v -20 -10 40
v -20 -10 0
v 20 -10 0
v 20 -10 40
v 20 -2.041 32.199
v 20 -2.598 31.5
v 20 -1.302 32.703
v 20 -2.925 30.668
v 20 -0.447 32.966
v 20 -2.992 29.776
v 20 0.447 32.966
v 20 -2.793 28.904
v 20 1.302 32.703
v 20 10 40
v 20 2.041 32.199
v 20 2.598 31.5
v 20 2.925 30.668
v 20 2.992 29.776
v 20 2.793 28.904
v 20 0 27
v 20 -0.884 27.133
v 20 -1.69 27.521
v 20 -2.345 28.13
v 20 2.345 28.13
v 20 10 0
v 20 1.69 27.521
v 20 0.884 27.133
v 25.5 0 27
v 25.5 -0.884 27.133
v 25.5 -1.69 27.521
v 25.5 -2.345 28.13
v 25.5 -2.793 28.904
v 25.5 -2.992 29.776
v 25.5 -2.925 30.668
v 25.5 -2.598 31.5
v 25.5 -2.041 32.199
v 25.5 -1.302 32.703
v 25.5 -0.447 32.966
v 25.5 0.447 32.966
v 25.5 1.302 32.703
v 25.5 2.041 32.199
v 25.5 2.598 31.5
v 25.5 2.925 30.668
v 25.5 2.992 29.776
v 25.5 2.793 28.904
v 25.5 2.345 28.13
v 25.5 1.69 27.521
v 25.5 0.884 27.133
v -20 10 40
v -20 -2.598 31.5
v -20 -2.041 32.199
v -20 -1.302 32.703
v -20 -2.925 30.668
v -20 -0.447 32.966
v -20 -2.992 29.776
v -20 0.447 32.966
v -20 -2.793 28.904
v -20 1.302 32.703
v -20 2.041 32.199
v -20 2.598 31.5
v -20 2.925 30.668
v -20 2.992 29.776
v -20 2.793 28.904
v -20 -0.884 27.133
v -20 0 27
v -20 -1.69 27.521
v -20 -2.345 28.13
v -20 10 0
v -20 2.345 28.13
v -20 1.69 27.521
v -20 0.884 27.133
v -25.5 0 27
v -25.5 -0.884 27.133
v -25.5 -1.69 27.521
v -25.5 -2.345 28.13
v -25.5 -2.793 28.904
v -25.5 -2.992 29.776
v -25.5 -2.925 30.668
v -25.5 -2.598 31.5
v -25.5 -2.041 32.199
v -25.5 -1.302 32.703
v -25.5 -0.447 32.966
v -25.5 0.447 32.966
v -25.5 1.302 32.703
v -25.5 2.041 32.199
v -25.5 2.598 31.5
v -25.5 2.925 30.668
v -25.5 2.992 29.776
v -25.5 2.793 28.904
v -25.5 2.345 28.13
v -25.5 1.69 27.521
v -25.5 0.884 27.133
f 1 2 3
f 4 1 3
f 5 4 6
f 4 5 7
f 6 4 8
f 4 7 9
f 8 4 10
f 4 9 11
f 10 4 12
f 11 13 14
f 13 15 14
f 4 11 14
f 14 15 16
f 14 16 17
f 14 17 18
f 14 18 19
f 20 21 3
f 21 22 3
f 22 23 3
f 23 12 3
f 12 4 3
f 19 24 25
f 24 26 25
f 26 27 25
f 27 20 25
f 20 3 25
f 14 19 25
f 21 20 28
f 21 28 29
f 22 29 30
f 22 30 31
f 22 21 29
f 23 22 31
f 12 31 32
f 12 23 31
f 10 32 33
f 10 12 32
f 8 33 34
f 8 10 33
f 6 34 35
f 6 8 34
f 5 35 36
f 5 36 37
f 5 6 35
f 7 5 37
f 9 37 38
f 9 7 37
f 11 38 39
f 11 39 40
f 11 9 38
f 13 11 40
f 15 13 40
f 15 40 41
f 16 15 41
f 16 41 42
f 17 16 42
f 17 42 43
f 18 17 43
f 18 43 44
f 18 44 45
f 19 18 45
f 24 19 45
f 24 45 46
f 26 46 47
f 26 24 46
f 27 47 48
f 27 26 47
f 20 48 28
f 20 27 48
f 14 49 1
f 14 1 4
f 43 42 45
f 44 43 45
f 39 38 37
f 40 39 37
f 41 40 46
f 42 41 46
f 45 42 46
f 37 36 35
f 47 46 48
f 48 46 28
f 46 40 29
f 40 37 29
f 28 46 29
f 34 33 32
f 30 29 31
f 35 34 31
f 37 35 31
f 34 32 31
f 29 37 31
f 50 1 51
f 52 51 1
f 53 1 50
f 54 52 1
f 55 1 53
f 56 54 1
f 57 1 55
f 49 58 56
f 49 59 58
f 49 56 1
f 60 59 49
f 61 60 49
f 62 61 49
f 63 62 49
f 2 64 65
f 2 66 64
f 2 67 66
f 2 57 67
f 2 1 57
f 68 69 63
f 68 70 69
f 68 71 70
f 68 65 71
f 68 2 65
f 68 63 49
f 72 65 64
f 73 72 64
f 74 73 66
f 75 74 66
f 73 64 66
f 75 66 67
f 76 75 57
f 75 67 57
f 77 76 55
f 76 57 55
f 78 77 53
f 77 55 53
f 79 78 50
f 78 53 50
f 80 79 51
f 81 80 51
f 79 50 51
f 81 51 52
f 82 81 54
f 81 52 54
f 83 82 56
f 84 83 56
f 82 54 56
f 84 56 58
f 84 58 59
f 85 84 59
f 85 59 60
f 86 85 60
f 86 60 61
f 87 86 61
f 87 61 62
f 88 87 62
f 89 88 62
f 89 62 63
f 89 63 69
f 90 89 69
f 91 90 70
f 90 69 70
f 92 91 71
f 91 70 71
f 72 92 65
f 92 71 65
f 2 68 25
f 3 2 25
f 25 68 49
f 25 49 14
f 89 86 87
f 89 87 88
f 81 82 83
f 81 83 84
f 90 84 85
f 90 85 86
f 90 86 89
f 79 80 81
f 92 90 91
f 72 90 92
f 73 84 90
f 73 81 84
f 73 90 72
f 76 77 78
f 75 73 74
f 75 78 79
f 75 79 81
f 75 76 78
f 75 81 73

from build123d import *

# Parameters (mm, degrees)
CROQUIS1_W              = 40
CROQUIS1_H              = 20
SALIENTE_EXTRUIR1_DEPTH = 40
CROQUIS2_R              = 3
SALIENTE_EXTRUIR2_DEPTH = 5.5


with BuildPart() as part:
    # Croquis1 → Saliente-Extruir1 (new body)
    with BuildSketch(Plane.XY):
        Rectangle(CROQUIS1_W, CROQUIS1_H)
    extrude(amount=SALIENTE_EXTRUIR1_DEPTH)

    # Croquis2 → Saliente-Extruir2 (add)
    with BuildSketch(Plane.ZY.offset(20)):
        with Locations(Location((30, 0, 0), (0, 0, 180))):
            Circle(CROQUIS2_R)
    saliente_extruir2 = extrude(amount=SALIENTE_EXTRUIR2_DEPTH)

    # Simetría1: Saliente-Extruir2 across plane
    add(saliente_extruir2.mirror(Plane(origin=(0, 0, 0), x_dir=(0, 0, 1), z_dir=(1, 0, 0))))


solid = part.part
